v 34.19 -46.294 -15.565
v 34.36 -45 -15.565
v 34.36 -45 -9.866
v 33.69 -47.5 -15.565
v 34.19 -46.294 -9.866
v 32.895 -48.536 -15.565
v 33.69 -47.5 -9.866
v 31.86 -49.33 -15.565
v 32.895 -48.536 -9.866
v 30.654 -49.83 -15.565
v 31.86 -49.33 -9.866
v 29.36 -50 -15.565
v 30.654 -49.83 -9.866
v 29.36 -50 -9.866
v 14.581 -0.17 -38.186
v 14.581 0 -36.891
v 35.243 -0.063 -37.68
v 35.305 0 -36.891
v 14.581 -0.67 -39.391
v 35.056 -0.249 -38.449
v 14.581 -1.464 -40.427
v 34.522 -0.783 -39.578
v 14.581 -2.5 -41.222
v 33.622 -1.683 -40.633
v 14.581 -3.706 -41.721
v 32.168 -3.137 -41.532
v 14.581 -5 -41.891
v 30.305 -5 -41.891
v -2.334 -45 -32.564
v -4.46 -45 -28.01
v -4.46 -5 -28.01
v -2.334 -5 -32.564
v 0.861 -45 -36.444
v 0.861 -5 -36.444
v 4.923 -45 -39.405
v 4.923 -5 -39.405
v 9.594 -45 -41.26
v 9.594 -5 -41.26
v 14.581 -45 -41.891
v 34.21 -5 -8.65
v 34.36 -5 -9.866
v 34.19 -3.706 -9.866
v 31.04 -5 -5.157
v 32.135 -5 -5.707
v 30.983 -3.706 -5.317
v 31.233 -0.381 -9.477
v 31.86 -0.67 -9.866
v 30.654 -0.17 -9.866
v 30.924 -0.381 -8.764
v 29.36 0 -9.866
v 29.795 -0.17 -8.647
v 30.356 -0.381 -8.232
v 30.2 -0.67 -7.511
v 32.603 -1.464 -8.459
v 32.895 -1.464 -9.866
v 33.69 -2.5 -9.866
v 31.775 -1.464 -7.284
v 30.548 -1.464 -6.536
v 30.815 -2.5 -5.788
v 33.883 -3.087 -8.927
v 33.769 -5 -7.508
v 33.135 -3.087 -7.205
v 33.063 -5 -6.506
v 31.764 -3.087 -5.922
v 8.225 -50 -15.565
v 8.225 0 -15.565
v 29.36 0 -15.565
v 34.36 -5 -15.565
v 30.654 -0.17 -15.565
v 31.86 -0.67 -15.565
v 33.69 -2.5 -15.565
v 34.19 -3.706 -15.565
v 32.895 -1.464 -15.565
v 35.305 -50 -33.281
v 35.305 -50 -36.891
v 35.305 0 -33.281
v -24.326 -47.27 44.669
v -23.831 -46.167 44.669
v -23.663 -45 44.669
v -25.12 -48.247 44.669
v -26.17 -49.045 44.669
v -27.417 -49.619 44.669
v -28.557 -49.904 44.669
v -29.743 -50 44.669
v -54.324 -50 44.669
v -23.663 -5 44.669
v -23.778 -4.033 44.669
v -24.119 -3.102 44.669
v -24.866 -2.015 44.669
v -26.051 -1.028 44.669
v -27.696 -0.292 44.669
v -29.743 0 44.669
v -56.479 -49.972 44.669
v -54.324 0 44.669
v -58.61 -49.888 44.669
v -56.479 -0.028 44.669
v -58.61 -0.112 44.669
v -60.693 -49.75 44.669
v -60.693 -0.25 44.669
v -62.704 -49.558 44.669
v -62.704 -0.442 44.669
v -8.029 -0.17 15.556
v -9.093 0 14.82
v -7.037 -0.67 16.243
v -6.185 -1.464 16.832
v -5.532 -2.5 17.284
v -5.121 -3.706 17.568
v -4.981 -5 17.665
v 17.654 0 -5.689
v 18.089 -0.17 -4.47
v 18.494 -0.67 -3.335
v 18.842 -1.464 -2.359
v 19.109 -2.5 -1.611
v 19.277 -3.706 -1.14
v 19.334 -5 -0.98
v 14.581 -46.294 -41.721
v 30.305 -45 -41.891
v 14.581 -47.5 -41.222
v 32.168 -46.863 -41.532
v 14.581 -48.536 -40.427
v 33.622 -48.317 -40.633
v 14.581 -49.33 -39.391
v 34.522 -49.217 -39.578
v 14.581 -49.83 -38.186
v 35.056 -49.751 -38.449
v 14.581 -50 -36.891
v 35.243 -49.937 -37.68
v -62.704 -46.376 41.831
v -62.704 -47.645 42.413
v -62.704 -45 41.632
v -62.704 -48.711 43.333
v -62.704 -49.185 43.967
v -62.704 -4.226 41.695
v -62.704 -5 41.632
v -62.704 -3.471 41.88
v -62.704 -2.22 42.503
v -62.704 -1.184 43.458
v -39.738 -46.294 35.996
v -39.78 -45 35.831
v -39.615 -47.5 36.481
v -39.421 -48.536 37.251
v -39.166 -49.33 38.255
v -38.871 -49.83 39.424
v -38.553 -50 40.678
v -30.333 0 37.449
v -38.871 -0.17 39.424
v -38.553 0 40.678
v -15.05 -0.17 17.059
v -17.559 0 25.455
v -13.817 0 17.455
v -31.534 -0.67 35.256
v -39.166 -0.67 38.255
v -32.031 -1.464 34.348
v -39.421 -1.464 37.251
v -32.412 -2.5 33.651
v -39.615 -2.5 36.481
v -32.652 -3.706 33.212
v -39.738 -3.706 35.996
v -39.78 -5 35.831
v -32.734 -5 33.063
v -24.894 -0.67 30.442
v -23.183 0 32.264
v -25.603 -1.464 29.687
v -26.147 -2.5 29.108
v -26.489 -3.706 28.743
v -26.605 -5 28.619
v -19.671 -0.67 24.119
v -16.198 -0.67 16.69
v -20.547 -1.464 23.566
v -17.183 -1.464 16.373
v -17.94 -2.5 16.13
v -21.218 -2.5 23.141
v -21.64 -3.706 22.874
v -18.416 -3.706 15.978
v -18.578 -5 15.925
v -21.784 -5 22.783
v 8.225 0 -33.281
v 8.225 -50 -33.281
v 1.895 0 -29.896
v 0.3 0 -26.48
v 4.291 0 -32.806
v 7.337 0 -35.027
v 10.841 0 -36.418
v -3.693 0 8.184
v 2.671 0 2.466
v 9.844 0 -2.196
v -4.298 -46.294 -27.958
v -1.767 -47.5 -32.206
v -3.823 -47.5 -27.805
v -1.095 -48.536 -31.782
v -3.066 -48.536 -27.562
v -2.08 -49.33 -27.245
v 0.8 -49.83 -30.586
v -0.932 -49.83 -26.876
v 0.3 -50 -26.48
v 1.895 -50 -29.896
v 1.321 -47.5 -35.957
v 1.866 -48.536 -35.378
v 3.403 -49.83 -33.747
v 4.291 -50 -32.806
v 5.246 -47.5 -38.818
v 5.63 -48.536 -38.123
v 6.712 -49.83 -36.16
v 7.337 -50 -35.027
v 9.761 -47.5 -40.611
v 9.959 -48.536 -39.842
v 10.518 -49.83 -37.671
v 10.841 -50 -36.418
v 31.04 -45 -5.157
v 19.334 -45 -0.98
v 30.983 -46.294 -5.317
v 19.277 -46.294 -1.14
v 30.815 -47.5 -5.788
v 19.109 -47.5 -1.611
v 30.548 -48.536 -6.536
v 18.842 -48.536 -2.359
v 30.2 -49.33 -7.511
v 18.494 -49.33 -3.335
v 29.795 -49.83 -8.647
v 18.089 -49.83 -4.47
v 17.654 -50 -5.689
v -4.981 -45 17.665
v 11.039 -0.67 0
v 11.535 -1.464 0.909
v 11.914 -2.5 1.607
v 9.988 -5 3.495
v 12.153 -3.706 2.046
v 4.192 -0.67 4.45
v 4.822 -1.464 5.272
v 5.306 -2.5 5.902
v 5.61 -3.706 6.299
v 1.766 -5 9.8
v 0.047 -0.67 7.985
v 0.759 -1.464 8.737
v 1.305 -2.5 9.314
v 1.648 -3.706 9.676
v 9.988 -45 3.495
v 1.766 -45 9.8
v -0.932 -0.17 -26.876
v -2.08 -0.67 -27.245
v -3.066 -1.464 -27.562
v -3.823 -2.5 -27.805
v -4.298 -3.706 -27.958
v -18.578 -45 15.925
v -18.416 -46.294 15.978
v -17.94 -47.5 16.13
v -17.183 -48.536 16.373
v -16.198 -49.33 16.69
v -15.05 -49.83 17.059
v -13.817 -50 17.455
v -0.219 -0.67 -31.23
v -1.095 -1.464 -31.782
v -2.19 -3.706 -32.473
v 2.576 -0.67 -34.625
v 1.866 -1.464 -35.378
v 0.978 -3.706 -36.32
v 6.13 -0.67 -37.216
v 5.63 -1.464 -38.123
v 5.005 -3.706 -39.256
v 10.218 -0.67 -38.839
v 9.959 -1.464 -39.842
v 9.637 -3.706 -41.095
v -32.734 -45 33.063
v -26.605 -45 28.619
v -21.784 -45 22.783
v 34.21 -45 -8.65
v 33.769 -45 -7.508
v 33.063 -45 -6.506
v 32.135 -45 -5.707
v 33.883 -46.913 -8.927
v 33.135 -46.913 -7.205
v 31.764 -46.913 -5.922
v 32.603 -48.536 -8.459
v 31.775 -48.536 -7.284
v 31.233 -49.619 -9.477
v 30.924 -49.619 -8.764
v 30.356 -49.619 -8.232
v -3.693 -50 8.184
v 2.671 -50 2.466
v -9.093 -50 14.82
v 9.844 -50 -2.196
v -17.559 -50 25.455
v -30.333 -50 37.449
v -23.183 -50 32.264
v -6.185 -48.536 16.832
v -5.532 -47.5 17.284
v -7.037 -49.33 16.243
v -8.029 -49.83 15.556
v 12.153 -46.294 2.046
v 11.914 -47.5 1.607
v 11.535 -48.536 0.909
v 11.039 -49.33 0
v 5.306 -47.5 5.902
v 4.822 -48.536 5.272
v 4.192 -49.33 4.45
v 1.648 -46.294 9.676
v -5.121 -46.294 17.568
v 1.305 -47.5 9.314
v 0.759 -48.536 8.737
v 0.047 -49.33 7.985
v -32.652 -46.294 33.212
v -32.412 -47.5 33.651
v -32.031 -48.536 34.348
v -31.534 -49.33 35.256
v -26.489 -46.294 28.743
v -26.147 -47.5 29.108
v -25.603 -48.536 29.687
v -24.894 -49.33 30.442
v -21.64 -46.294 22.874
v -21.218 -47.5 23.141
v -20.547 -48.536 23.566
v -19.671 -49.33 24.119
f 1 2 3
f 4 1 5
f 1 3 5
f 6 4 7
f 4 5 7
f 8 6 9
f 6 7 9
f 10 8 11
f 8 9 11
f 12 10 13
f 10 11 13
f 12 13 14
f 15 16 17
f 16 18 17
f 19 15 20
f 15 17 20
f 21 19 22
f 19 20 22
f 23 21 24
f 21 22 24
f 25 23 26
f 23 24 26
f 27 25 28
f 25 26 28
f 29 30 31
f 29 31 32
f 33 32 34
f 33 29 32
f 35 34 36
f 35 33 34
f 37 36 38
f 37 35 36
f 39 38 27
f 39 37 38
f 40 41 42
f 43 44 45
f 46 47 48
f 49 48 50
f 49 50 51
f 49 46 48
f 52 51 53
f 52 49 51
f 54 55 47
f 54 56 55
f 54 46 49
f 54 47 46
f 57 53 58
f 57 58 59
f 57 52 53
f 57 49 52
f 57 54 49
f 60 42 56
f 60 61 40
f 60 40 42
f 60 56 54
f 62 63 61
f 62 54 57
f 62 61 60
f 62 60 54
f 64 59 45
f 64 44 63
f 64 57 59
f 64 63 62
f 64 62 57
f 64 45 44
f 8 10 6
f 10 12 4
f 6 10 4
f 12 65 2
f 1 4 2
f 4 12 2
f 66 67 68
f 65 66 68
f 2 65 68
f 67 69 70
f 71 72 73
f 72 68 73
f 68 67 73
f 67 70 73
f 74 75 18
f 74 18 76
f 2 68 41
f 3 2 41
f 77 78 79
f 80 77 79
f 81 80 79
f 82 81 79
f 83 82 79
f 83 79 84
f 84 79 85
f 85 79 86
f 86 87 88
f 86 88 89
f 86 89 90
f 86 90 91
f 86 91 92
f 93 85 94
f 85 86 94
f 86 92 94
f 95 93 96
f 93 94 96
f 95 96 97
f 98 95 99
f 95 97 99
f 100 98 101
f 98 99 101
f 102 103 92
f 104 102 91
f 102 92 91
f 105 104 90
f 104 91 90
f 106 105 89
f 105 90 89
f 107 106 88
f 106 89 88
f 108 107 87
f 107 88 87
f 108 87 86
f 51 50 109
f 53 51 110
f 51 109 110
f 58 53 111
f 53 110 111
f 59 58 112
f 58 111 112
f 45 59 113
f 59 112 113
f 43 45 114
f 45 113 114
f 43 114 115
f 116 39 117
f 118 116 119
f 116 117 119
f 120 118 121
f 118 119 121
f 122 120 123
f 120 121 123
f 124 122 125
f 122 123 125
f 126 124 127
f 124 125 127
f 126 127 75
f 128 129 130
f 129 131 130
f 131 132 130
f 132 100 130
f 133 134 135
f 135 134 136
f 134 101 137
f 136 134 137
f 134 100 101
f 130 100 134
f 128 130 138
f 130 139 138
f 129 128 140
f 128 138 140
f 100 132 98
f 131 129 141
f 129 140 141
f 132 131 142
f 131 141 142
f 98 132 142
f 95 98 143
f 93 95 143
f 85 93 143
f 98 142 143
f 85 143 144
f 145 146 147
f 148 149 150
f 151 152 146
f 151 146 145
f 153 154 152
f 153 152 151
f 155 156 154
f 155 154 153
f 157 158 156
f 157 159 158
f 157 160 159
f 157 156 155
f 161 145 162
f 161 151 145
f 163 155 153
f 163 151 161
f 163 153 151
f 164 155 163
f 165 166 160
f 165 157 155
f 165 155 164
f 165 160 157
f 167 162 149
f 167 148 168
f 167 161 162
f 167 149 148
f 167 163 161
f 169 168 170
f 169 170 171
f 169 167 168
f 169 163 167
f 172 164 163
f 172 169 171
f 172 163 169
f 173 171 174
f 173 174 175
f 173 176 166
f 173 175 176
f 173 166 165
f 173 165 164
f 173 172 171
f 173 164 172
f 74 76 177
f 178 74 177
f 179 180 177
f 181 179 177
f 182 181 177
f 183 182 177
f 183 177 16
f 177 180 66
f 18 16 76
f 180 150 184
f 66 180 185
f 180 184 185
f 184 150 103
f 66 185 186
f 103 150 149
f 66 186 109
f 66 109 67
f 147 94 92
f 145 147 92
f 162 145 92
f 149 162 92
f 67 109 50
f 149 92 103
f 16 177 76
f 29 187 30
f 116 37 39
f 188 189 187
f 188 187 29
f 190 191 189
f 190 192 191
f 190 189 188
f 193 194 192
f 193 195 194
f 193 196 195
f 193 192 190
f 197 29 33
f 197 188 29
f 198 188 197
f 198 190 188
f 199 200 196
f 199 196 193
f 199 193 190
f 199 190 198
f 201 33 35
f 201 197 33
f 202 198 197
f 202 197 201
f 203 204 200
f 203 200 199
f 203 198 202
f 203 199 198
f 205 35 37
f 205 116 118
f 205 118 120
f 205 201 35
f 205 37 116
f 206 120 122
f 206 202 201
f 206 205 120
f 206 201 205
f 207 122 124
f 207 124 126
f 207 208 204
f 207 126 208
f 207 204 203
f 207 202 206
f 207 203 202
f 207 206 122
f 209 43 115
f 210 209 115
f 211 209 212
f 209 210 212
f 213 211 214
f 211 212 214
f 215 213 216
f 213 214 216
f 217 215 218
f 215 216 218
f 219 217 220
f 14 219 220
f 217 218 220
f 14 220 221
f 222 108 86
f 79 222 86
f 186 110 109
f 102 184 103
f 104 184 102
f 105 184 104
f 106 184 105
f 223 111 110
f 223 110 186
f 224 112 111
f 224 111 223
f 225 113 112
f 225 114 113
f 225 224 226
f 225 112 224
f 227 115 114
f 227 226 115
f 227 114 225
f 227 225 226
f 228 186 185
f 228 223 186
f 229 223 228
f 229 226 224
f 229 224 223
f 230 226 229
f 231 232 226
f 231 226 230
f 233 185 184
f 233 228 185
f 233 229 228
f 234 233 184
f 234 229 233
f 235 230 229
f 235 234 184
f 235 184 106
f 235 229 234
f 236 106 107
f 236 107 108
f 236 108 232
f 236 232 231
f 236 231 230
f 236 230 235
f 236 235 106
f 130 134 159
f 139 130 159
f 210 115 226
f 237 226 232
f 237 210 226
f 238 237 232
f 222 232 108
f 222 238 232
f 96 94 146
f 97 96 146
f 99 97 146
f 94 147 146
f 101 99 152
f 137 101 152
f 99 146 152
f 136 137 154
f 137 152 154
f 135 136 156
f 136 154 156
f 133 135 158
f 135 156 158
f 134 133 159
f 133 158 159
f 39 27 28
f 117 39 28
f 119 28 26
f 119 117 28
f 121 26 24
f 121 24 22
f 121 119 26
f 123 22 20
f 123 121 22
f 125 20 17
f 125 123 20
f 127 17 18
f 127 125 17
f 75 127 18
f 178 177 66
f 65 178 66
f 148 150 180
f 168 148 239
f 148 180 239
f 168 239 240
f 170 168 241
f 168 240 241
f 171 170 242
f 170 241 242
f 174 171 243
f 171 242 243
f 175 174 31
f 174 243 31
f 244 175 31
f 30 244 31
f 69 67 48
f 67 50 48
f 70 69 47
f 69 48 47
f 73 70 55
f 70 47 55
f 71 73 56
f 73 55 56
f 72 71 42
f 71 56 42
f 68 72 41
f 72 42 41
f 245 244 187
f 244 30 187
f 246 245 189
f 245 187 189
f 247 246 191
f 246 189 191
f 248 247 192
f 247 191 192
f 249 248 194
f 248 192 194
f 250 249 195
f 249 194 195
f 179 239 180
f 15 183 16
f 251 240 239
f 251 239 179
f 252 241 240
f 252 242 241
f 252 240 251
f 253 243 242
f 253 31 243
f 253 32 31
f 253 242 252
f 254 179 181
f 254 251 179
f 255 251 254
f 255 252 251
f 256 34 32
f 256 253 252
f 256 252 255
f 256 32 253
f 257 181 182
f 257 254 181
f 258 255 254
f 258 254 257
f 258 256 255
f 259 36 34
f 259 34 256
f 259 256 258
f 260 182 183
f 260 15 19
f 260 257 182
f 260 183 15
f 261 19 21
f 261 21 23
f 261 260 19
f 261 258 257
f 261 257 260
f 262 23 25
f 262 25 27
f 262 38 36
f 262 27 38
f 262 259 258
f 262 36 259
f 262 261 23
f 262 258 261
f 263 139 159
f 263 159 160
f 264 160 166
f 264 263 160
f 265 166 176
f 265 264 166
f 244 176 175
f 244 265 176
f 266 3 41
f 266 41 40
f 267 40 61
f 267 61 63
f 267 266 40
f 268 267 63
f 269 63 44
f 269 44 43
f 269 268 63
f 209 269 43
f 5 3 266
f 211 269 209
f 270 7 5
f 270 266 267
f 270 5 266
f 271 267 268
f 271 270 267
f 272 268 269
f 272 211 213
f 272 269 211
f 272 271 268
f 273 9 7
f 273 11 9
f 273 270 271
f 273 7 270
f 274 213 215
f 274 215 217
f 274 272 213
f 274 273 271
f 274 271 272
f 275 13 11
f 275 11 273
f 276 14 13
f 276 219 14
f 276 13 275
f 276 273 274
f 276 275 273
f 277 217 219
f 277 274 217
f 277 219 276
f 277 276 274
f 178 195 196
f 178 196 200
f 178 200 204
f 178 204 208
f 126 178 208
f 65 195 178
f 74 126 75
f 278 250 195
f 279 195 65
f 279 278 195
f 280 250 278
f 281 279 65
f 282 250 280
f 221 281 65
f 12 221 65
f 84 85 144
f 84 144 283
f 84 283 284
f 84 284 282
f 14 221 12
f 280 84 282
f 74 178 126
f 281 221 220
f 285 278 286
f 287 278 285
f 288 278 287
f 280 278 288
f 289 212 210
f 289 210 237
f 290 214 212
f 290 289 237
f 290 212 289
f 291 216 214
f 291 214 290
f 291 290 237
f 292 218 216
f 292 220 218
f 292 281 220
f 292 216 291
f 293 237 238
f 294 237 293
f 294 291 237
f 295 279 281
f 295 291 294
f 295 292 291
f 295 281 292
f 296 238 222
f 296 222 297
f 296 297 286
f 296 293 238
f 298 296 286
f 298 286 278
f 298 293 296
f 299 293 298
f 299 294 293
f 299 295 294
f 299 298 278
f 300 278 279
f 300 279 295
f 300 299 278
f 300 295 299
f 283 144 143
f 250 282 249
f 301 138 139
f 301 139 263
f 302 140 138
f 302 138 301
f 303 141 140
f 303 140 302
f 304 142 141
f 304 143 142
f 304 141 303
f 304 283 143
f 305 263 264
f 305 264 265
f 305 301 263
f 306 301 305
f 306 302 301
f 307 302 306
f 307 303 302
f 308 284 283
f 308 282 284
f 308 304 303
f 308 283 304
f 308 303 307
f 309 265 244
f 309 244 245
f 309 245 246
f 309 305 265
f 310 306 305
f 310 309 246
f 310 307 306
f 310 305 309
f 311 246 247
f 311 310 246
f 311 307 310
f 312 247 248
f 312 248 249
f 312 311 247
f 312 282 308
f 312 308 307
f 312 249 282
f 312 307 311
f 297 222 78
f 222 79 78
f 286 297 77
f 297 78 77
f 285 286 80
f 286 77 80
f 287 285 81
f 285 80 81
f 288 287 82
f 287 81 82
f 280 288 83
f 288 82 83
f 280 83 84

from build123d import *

# Parameters (mm, degrees)
F1_DEPTH = 50
F2_R     = 50
F3_R     = 30
F4_R     = 20
F5_R     = 5
F6_R     = 5


with BuildPart() as f1:
    # F0 (on Front) → F1 (new body)
    with BuildSketch(Plane.XZ):
        Polygon((-23.6634109169, 31.7528273398), (0, -41.8914239646), (35.305287689, -41.8914239646), (35.305287689, -33.2806184888), (8.2252407447, -33.2806184888), (8.2252407447, -15.5646987259), (34.3599072305, -15.5646987259), (34.3599072305, -6.3414066872), (4.1758916341, 4.428982269), (-23.6634109169, 44.6694269776), (-62.7042563281, 44.6694269776), (-62.7042563281, 41.6324101388), align=None)
    extrude(amount=F1_DEPTH)

    # F2
    f2_edges = [f1.edges().sort_by_distance(p)[0] for p in [
        (4.175892, -25, 4.428982),
    ]]
    fillet(f2_edges, radius=F2_R)

    # F3
    f3_edges = [f1.edges().sort_by_distance(p)[0] for p in [
        (-23.663411, -25, 31.752827),
    ]]
    fillet(f3_edges, radius=F3_R)

    # F4
    f4_edges = [f1.edges().sort_by_distance(p)[0] for p in [
        (0, -25, -41.891424),
    ]]
    fillet(f4_edges, radius=F4_R)

    # F5
    f5_edges = [f1.edges().sort_by_distance(p)[0] for p in [
        (35.305288, -25, -41.891424),
        (34.359907, -25, -6.341407),
        (2.798647, 0, -38.052587),
        (-4.460469, -25, -28.009743),
        (14.580701, -25, -41.891424),
        (2.798647, -50, -38.052587),
    ]]
    fillet(f5_edges, radius=F5_R)

    # F6
    f6_edges = [f1.edges().sort_by_distance(p)[0] for p in [
        (-14.322206, -50, 31.16714),
        (5.713271, 0, 6.433938),
    ]]
    fillet(f6_edges, radius=F6_R)


solid = f1.part
